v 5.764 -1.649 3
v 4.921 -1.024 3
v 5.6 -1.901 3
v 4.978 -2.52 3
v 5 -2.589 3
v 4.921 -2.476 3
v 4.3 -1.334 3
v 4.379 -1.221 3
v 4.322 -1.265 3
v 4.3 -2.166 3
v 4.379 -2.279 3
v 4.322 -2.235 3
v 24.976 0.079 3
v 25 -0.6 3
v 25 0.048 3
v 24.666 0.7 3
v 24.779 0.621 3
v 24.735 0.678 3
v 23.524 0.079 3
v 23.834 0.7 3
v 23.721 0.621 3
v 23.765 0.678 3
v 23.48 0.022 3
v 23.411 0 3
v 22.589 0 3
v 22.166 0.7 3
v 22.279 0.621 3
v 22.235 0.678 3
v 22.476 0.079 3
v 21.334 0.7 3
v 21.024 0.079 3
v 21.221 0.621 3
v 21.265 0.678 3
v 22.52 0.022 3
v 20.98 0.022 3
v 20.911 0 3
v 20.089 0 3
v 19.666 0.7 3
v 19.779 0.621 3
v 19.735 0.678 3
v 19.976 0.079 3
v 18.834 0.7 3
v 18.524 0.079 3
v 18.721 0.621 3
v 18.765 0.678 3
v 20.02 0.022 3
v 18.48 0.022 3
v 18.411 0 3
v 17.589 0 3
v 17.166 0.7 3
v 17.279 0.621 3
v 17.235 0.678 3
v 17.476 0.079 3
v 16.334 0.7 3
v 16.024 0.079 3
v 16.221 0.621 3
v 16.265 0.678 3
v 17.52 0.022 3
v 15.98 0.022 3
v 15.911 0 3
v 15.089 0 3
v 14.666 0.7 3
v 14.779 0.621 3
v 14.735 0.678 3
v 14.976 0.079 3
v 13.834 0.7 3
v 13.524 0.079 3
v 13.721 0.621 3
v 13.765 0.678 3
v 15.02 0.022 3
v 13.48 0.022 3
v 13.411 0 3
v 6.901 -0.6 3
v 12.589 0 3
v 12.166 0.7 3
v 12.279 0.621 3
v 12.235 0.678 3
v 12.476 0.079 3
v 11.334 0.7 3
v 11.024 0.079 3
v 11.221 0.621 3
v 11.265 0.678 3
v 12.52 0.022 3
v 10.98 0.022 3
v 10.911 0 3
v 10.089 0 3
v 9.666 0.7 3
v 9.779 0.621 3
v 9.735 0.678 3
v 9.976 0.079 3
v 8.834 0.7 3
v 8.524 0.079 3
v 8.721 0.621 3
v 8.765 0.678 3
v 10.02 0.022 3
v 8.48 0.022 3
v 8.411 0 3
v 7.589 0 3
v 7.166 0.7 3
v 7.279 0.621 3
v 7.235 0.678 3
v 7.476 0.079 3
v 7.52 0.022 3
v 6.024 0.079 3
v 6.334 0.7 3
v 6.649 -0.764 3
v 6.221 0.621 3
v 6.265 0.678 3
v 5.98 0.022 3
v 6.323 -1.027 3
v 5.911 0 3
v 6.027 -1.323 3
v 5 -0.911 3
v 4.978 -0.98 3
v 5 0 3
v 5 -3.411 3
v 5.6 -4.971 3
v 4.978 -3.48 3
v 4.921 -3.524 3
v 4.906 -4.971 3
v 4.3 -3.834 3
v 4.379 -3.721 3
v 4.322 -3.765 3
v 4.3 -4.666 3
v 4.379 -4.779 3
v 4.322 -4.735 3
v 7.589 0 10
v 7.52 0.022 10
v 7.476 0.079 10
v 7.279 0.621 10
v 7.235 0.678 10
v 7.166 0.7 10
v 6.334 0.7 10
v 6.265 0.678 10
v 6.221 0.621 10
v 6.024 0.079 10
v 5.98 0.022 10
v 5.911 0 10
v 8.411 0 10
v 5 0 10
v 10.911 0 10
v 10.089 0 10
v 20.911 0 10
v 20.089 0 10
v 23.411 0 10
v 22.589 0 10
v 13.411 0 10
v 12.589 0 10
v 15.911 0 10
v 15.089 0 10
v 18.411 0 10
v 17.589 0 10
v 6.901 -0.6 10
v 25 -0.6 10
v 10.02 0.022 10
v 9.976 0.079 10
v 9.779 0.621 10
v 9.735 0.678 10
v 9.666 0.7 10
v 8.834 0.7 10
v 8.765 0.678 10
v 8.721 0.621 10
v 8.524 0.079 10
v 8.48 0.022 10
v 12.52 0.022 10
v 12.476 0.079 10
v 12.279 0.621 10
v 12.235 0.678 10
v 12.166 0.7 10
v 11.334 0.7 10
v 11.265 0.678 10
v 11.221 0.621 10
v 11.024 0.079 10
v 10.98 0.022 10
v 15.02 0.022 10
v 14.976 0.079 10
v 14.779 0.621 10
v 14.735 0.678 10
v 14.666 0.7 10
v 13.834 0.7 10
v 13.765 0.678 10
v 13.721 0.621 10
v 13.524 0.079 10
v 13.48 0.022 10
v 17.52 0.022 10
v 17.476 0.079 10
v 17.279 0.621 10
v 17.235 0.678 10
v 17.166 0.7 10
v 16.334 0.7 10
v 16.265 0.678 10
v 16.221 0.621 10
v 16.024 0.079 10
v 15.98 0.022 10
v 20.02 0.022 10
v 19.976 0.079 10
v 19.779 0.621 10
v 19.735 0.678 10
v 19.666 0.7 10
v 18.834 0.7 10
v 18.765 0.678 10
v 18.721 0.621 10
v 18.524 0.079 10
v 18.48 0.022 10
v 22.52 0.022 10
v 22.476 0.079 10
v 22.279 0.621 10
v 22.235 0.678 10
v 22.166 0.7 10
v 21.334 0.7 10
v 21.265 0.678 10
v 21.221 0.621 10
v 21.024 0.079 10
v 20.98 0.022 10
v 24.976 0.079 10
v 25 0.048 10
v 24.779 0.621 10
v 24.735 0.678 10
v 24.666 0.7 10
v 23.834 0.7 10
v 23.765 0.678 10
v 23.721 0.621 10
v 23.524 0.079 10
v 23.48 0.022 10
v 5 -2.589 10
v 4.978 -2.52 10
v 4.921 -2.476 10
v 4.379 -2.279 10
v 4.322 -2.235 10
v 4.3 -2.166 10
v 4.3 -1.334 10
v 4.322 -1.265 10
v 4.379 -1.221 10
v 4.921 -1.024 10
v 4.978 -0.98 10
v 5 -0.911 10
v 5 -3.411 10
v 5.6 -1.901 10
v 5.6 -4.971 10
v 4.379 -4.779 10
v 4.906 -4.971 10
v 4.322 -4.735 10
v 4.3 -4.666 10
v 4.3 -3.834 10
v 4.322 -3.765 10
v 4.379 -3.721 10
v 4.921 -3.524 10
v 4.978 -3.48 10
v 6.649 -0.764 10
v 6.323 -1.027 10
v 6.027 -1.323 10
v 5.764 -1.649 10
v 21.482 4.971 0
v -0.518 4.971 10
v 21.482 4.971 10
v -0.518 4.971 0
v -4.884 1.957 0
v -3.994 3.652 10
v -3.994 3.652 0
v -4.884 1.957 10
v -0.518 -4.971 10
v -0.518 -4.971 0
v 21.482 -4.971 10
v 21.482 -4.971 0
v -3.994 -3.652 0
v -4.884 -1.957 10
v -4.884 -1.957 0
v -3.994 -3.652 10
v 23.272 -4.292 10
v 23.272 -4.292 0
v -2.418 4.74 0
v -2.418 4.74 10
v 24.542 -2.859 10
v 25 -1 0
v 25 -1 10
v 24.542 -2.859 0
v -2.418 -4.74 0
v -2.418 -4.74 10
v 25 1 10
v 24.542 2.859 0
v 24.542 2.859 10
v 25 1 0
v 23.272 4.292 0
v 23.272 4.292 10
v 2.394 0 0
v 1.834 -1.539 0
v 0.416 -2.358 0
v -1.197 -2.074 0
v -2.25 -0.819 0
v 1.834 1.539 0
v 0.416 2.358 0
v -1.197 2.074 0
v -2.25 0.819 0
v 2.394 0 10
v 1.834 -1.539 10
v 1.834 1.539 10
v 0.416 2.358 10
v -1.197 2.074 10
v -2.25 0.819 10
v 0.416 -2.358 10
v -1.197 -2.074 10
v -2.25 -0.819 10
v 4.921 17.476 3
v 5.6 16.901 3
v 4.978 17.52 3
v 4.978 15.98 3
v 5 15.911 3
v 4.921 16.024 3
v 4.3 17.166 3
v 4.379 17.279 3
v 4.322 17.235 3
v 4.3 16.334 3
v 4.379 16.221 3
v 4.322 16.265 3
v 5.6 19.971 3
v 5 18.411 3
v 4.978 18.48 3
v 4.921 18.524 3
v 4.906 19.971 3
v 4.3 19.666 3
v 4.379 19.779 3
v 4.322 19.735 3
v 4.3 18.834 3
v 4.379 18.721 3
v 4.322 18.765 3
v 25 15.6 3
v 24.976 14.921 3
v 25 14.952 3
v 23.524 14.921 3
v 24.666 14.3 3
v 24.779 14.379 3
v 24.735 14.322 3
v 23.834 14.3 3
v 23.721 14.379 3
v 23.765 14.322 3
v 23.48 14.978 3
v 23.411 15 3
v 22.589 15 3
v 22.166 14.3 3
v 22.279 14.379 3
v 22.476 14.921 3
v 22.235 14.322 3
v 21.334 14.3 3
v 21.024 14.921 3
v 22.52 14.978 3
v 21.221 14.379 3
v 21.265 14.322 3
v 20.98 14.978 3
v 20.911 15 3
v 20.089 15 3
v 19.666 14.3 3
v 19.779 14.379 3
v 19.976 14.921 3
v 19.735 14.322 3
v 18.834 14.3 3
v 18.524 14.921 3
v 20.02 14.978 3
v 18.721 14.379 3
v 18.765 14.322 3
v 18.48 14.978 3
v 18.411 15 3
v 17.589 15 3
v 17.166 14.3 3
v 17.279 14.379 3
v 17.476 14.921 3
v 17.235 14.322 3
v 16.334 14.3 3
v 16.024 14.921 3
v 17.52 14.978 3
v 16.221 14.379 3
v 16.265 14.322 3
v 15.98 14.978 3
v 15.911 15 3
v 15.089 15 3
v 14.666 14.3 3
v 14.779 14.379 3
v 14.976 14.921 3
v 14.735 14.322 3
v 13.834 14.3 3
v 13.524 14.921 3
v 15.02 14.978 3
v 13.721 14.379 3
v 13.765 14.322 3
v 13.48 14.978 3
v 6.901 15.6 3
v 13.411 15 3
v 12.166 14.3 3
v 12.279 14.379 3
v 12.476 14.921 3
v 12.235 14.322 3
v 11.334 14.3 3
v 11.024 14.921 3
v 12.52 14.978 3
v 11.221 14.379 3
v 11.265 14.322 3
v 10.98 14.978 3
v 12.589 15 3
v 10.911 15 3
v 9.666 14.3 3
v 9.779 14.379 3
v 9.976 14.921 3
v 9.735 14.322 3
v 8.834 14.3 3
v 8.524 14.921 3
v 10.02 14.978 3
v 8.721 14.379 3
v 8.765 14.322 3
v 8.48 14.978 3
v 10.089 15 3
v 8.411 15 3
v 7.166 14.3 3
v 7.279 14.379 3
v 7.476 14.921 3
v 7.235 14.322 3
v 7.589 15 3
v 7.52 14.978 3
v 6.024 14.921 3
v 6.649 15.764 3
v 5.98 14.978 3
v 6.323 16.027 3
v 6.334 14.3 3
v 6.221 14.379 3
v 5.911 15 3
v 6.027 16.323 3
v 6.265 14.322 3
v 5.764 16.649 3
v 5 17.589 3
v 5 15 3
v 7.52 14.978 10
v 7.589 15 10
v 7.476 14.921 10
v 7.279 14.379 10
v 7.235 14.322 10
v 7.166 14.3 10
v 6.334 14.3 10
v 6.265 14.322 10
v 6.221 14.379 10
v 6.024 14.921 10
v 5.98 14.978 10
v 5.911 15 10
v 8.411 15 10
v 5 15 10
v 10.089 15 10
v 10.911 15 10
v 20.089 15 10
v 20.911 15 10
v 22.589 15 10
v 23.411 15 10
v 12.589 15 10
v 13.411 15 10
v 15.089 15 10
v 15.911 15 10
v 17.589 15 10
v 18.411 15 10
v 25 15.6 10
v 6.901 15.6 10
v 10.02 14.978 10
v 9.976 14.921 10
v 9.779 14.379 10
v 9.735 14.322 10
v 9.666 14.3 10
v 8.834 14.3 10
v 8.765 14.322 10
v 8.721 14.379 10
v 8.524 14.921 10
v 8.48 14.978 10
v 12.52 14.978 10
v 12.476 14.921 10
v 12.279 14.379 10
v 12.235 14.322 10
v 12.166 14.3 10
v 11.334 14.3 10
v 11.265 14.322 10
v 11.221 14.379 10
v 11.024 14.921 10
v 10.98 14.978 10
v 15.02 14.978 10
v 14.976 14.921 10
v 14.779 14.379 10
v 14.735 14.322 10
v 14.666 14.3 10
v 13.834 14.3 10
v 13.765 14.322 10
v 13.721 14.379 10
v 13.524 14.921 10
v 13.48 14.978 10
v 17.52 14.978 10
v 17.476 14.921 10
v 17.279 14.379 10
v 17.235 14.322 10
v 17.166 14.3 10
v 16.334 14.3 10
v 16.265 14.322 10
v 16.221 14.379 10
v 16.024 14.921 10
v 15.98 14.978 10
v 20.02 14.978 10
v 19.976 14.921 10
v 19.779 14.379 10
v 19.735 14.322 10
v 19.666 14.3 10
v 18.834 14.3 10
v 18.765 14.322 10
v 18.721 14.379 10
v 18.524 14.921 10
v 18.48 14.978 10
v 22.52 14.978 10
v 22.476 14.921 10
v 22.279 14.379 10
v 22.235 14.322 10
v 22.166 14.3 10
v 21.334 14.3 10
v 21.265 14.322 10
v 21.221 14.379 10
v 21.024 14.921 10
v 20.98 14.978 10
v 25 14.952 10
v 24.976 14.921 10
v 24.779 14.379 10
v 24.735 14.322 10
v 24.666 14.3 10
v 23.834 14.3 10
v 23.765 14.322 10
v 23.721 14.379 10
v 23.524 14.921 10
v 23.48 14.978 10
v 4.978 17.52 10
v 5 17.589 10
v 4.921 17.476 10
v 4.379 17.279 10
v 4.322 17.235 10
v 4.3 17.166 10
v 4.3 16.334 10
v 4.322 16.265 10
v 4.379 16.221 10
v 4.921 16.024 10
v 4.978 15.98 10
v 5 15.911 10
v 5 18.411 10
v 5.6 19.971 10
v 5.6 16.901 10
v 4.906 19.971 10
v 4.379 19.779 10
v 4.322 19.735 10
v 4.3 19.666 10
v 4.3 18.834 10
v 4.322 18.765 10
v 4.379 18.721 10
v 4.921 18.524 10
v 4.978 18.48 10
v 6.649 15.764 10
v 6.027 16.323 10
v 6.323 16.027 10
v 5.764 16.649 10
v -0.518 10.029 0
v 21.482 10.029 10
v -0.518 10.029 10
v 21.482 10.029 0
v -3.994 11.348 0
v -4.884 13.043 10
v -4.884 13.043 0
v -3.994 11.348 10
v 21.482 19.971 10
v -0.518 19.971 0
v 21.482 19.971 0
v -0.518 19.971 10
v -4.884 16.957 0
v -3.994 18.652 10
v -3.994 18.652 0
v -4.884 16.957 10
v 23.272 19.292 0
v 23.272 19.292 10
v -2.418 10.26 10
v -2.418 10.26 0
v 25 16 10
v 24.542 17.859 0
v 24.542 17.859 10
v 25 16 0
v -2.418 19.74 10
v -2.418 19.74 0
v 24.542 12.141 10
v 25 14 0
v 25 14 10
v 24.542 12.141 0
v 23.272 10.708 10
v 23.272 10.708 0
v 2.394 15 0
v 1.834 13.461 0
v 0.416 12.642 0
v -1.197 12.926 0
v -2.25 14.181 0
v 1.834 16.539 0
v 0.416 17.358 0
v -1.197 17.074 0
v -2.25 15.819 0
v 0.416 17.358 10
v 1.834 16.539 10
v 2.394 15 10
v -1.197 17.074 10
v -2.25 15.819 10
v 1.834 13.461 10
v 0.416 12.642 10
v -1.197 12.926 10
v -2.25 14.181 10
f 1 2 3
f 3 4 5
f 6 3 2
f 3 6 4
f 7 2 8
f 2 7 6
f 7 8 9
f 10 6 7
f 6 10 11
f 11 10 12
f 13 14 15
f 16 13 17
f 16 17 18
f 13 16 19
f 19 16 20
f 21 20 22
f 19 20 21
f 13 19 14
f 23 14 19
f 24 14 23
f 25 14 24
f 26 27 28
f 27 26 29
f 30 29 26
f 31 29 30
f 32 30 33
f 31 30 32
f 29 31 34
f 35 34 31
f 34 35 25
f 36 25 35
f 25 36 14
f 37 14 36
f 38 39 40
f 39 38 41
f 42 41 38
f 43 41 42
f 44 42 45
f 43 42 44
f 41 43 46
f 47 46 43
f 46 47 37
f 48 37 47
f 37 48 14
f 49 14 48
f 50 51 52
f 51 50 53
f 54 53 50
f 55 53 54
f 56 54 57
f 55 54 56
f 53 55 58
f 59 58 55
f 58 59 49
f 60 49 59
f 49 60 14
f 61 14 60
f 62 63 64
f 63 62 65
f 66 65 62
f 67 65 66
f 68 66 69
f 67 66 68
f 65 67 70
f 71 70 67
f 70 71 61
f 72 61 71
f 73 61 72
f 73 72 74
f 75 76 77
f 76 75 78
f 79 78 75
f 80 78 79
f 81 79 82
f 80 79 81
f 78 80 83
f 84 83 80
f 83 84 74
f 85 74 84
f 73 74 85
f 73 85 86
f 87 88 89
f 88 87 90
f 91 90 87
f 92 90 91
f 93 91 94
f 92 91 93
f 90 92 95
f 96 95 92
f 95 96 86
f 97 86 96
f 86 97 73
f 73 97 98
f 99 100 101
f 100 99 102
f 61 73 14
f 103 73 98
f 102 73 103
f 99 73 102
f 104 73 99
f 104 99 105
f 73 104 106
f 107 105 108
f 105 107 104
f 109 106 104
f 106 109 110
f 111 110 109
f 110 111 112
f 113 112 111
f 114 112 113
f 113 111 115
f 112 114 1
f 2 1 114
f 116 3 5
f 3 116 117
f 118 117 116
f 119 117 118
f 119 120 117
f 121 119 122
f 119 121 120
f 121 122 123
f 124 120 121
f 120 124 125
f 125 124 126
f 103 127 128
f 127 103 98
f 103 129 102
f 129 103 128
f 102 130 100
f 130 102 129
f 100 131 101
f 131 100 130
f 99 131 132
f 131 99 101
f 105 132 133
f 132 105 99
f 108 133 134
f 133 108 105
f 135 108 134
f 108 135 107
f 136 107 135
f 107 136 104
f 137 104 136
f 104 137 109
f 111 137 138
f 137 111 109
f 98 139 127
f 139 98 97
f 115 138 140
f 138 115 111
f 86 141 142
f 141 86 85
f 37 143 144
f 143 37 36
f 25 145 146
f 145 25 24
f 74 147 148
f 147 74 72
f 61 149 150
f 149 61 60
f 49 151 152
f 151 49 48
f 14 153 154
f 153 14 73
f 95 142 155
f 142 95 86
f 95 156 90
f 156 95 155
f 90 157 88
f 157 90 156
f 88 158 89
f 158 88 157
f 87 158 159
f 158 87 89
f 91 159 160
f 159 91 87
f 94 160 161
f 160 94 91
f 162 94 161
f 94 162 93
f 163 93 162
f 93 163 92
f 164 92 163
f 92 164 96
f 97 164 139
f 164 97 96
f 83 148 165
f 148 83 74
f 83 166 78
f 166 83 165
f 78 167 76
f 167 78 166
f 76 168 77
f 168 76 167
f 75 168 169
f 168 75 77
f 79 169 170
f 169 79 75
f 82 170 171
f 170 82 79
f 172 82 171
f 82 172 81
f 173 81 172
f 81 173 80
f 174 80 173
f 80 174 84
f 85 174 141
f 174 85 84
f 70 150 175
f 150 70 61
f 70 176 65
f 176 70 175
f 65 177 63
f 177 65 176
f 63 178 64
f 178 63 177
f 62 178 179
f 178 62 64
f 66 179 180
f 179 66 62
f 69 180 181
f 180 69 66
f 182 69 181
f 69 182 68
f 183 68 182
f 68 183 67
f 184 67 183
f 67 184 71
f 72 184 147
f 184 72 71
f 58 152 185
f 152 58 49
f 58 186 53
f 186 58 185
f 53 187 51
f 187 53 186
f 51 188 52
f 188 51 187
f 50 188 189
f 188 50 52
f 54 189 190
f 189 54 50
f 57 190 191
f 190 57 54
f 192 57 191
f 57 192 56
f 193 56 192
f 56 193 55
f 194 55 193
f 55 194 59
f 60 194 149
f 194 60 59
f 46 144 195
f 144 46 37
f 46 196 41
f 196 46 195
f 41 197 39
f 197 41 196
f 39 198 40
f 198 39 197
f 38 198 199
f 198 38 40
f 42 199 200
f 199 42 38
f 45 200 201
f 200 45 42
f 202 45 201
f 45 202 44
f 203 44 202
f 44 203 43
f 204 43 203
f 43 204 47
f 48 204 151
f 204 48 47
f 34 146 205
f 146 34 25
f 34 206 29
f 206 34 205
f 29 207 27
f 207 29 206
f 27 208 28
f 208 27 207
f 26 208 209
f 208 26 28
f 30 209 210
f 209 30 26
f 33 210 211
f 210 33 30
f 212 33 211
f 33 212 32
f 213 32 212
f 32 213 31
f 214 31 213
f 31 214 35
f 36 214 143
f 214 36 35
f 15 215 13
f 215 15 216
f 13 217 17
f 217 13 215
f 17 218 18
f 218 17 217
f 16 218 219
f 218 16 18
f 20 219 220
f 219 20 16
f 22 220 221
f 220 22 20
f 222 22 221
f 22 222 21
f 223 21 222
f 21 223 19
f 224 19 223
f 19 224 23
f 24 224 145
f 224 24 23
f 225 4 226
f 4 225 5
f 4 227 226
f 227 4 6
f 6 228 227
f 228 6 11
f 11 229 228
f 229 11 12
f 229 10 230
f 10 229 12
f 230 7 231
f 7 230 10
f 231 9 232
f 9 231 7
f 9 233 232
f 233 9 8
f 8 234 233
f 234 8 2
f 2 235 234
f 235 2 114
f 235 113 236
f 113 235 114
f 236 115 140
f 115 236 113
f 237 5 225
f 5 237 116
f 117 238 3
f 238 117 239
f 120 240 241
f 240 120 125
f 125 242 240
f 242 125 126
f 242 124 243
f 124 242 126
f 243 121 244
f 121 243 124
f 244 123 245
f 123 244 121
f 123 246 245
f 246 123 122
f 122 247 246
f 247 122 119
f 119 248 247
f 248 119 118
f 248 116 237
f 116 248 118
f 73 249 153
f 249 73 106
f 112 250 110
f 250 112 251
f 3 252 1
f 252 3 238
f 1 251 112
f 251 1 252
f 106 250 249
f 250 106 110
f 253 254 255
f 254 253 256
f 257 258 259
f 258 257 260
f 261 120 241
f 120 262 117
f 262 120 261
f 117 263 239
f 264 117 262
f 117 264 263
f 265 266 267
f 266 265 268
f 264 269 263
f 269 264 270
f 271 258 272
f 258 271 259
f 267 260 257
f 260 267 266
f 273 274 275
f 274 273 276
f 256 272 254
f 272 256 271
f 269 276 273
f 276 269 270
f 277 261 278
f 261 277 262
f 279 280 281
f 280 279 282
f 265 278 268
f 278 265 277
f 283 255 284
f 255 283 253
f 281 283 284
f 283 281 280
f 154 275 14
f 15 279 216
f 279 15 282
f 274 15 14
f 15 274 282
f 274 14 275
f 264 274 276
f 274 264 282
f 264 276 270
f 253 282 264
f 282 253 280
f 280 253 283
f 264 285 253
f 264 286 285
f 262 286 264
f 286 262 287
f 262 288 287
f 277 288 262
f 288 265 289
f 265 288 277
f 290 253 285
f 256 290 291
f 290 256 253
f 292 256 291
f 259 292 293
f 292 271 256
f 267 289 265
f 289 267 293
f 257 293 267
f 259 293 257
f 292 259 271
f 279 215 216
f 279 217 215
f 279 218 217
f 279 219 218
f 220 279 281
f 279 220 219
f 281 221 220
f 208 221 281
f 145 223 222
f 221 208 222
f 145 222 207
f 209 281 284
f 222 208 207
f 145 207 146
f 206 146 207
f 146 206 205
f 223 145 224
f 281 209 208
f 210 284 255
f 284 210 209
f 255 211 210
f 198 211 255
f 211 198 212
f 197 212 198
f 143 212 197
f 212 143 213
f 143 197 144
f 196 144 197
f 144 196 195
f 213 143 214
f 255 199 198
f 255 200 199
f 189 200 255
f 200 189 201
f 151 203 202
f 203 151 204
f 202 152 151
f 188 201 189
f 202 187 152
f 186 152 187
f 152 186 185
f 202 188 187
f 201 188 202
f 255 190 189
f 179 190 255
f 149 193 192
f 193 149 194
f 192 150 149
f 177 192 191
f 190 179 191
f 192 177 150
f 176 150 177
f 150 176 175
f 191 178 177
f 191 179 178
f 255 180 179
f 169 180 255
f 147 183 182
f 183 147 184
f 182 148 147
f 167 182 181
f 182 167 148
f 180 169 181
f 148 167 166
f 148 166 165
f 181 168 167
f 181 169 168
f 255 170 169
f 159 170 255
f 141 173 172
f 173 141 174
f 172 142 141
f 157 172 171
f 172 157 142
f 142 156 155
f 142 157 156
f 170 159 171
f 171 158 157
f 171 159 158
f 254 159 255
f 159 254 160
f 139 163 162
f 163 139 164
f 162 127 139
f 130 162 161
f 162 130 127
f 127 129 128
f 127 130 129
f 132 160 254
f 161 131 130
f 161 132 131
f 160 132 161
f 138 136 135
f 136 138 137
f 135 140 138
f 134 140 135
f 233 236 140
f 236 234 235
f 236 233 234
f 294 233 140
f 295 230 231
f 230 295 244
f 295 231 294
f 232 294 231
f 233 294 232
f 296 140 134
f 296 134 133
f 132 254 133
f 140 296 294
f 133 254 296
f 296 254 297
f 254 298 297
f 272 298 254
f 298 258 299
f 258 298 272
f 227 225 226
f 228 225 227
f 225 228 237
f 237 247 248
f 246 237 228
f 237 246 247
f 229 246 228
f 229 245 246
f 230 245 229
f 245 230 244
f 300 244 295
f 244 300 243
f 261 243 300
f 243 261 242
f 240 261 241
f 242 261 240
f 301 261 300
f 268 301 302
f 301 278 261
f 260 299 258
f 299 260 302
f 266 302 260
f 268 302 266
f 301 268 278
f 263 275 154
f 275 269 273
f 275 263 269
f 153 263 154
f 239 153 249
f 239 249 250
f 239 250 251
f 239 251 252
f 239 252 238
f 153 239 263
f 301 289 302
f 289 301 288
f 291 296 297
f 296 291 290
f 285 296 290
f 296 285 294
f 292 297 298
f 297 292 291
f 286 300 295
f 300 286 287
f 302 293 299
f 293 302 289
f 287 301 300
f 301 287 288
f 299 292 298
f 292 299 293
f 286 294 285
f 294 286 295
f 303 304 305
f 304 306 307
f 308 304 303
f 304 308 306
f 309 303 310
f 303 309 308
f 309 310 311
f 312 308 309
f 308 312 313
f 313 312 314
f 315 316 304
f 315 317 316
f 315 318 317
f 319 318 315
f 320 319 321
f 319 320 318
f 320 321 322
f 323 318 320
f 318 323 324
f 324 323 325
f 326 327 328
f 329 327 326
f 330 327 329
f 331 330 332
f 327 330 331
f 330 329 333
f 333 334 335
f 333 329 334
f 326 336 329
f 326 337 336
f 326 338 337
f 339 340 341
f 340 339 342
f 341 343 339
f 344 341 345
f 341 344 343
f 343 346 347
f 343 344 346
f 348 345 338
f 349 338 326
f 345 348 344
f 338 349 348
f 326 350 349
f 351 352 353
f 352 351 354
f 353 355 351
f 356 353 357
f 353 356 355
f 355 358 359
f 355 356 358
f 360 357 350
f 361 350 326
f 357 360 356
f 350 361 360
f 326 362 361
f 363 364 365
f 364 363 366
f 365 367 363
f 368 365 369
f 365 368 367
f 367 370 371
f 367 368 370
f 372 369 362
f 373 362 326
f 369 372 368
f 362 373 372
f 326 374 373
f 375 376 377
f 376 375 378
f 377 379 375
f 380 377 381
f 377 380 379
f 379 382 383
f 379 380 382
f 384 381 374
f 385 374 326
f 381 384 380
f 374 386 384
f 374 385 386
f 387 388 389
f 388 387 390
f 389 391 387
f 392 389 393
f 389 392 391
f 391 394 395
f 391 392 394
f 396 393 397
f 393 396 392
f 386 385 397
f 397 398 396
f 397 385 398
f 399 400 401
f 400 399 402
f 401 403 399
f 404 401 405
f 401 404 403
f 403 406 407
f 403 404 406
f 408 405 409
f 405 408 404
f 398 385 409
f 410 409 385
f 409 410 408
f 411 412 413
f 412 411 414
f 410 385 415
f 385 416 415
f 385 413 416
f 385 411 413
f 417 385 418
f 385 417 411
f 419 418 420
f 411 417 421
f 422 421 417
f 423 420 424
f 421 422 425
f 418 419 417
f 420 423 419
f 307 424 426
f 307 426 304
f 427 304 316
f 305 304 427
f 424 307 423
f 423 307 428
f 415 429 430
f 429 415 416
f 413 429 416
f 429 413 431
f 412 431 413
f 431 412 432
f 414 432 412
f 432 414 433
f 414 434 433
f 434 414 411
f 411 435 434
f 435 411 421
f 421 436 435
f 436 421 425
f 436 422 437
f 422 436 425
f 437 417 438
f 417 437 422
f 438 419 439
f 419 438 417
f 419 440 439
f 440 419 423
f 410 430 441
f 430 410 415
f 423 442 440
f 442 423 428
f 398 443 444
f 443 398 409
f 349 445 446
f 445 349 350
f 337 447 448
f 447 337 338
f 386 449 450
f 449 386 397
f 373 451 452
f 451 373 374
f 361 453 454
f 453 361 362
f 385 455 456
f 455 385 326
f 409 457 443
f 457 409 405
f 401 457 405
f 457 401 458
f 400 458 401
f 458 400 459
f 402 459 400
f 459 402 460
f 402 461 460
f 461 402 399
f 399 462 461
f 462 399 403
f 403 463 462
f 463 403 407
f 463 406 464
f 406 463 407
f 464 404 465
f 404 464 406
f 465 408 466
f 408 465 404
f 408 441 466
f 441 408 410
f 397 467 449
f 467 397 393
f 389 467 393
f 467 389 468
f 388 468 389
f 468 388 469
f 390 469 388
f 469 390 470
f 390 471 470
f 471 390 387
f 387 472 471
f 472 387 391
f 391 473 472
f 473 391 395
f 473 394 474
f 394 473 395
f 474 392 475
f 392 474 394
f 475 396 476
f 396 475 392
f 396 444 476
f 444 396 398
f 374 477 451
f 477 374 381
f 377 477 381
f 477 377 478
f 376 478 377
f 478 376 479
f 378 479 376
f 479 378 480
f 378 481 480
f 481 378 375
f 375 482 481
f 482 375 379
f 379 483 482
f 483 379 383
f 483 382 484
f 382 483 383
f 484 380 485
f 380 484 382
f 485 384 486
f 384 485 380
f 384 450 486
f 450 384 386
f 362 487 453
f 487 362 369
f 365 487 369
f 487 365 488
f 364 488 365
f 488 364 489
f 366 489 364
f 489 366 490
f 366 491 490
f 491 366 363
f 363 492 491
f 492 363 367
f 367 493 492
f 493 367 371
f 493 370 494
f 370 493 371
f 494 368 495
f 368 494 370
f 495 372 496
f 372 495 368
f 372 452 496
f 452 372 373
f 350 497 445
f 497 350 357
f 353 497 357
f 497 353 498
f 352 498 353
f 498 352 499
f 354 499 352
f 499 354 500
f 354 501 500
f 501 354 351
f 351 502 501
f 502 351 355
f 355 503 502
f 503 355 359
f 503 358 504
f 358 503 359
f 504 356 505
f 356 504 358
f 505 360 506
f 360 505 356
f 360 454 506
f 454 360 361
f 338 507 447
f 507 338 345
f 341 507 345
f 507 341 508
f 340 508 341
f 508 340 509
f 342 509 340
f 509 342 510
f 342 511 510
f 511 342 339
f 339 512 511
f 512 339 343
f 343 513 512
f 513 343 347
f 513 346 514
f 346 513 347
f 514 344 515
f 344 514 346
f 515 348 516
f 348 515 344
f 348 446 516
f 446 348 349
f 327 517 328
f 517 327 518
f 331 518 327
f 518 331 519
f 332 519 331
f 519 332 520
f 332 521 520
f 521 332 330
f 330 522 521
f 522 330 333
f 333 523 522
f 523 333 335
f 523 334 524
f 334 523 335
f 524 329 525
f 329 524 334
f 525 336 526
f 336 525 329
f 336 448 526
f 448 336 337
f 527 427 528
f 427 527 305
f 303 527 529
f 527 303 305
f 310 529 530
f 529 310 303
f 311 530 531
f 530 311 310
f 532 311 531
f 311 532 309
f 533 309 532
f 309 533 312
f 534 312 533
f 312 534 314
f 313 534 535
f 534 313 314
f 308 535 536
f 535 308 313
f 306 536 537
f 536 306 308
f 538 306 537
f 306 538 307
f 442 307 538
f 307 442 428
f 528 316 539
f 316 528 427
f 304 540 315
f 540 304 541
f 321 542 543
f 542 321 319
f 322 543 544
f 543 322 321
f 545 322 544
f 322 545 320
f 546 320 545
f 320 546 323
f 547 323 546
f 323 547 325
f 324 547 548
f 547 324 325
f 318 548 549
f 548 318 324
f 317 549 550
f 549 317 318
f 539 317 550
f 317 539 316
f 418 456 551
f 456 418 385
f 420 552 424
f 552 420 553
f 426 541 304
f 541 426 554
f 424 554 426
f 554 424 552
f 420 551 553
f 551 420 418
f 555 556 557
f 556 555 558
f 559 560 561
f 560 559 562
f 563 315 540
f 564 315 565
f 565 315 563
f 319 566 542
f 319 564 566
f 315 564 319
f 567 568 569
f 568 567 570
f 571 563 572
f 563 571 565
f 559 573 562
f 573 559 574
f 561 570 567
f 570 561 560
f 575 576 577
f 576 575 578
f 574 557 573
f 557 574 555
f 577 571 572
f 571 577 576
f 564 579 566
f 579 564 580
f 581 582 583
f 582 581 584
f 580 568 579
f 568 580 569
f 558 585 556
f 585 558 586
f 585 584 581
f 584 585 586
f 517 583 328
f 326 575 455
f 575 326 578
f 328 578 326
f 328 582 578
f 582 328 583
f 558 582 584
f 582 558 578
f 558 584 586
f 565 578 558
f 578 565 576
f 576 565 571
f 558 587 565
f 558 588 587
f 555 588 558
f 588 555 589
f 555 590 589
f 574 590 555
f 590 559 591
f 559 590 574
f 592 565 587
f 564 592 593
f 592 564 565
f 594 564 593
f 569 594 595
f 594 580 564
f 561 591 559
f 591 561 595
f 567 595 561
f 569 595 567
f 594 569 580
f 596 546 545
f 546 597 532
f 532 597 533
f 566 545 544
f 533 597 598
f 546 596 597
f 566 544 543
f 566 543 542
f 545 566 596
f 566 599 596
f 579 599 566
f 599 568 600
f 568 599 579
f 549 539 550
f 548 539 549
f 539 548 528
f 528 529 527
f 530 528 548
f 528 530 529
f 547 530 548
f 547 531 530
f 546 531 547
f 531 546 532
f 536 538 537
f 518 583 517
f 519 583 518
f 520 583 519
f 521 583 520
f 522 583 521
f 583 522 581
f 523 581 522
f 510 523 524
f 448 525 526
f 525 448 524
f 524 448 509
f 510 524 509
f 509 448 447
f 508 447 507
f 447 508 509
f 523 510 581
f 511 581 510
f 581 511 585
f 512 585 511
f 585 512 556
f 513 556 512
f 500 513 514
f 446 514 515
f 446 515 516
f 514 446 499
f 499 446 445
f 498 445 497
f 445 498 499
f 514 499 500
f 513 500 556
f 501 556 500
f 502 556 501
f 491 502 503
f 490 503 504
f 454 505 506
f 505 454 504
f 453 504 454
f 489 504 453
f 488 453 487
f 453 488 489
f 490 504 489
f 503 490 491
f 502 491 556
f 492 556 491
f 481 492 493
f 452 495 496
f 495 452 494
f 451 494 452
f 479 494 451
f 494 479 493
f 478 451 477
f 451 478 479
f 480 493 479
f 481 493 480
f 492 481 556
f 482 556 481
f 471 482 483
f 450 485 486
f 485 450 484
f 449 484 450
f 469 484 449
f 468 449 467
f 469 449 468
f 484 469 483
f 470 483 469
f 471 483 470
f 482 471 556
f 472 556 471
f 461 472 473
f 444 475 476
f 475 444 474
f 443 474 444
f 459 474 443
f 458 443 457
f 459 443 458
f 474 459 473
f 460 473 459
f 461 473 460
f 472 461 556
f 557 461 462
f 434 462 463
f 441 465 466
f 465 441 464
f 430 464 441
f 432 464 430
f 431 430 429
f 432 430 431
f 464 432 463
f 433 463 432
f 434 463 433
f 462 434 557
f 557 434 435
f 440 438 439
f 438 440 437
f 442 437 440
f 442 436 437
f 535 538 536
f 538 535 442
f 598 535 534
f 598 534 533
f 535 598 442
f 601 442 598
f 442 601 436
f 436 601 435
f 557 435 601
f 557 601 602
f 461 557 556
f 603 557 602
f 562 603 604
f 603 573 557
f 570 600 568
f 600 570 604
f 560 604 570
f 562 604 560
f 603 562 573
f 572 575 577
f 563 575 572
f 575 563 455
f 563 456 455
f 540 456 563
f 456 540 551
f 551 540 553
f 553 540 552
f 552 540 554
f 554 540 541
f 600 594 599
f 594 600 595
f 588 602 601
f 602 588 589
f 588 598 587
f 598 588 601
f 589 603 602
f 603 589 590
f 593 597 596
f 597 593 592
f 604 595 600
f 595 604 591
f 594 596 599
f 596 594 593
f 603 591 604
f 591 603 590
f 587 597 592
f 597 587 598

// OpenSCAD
// file: timing_belts.scad
/*Parametric belting section generator 
By - The DoomMeister
Derived from http://www.thingiverse.com/thing:16627 by Droftarts
*/


//Variables
tooth_profile = "MXL"; // "T2.5", "T5" , "T10"
belt_width = 4;
n = 20;

//Draw
/*
belt_length(profile = tooth_profile, belt_width = 10, n = 30);
translate([0,0,-20])color("red")belt_length(profile = "T5", belt_width = 10, n = 15);
translate([0,0,-40])color("green")belt_length(profile = "T10", belt_width = 10, n = 8);
*/

//Outer Module
module belt_length(profile = "T2.5", belt_width = 6, n = 10)
{

			if ( profile == "T2.5" ) 
				{ 
					_belt_length(
						profile=profile, 
						n = n, 
						belt_width = belt_width,
						tooth_pitch = 2.5,
						backing_thickness = 0.6	
						);
				}
			if ( profile == "T5" ) 
				{ 
					_belt_length(
						profile=profile, 
						n = n, 
						belt_width = belt_width,
						tooth_pitch = 5,
						backing_thickness = 1	
						);
				}
			if ( profile == "T10" ) 
				{ 
					_belt_length(
						profile=profile, 
						n = n, 
						belt_width = belt_width,
						tooth_pitch = 10,
						backing_thickness = 2
						);
				}
			if ( profile == "MXL" ) 
				{ 
					_belt_length(
						profile=profile, 
						n = n, 
						belt_width = belt_width,
						tooth_pitch = 2.032,
						backing_thickness = 0.64
						);
				}


}



//inner module
module _belt_length(profile = "T2.5", n = 10, belt_width = 5, tooth_pitch = 2.5, backing_thickness = 0.6)
{

for( i = [0:n])
	{
		union(){

			if ( profile == "T2.5" ) { translate([tooth_pitch*i,0,0])T2_5(width = belt_width);}
			if ( profile == "T5" ) { translate([tooth_pitch*i,0,0])T5(width = belt_width);}
			if ( profile == "T10" ) { translate([tooth_pitch*i,0,0])T10(width = belt_width);}
			if ( profile == "MXL" ) { translate([tooth_pitch*i,0,0])MXL(width = belt_width);}
			translate([(tooth_pitch*i)-(tooth_pitch/2),-backing_thickness,0])cube([tooth_pitch,backing_thickness,belt_width]);
		}
	}
}



//Tooth Form modules - Taken from http://www.thingiverse.com/thing:1662
module T2_5(width = 2)
	{
	linear_extrude(height=width) polygon([[-0.839258,-0.5],[-0.839258,0],[-0.770246,0.021652],[-0.726369,0.079022],[-0.529167,0.620889],[-0.485025,0.67826],[-0.416278,0.699911],[0.416278,0.699911],[0.484849,0.67826],[0.528814,0.620889],[0.726369,0.079022],[0.770114,0.021652],[0.839258,0],[0.839258,-0.5]]);
	}

module T5(width = 2)
	{
	linear_extrude(height=width) polygon([[-1.632126,-0.5],[-1.632126,0],[-1.568549,0.004939],[-1.507539,0.019367],[-1.450023,0.042686],[-1.396912,0.074224],[-1.349125,0.113379],[-1.307581,0.159508],[-1.273186,0.211991],[-1.246868,0.270192],[-1.009802,0.920362],[-0.983414,0.978433],[-0.949018,1.030788],[-0.907524,1.076798],[-0.859829,1.115847],[-0.80682,1.147314],[-0.749402,1.170562],[-0.688471,1.184956],[-0.624921,1.189895],[0.624971,1.189895],[0.688622,1.184956],[0.749607,1.170562],[0.807043,1.147314],[0.860055,1.115847],[0.907754,1.076798],[0.949269,1.030788],[0.9837,0.978433],[1.010193,0.920362],[1.246907,0.270192],[1.273295,0.211991],[1.307726,0.159508],[1.349276,0.113379],[1.397039,0.074224],[1.450111,0.042686],[1.507589,0.019367],[1.568563,0.004939],[1.632126,0],[1.632126,-0.5]]);
	}

module T10(width = 2)
	{
	linear_extrude(height=width) polygon([[-3.06511,-1],[-3.06511,0],[-2.971998,0.007239],[-2.882718,0.028344],[-2.79859,0.062396],[-2.720931,0.108479],[-2.651061,0.165675],[-2.590298,0.233065],[-2.539962,0.309732],[-2.501371,0.394759],[-1.879071,2.105025],[-1.840363,2.190052],[-1.789939,2.266719],[-1.729114,2.334109],[-1.659202,2.391304],[-1.581518,2.437387],[-1.497376,2.47144],[-1.408092,2.492545],[-1.314979,2.499784],[1.314979,2.499784],[1.408091,2.492545],[1.497371,2.47144],[1.581499,2.437387],[1.659158,2.391304],[1.729028,2.334109],[1.789791,2.266719],[1.840127,2.190052],[1.878718,2.105025],[2.501018,0.394759],[2.539726,0.309732],[2.59015,0.233065],[2.650975,0.165675],[2.720887,0.108479],[2.798571,0.062396],[2.882713,0.028344],[2.971997,0.007239],[3.06511,0],[3.06511,-1]]);
	}

module MXL(width = 2)
	{
	linear_extrude(height=width) polygon([[-0.660421,-0.5],[-0.660421,0],[-0.621898,0.006033],[-0.587714,0.023037],[-0.560056,0.049424],[-0.541182,0.083609],[-0.417357,0.424392],[-0.398413,0.458752],[-0.370649,0.48514],[-0.336324,0.502074],[-0.297744,0.508035],[0.297744,0.508035],[0.336268,0.502074],[0.370452,0.48514],[0.39811,0.458752],[0.416983,0.424392],[0.540808,0.083609],[0.559752,0.049424],[0.587516,0.023037],[0.621841,0.006033],[0.660421,0],[0.660421,-0.5]]);
	}
// file: util.scad
module hexagon(size, h, center=false) {
    boxWidth=size/1.75;
    translate ([0, 0, center ? 0 : h/2]) {
        union(){
            cube([boxWidth, size, h], center=true);
            rotate([0,0,60]) cube([boxWidth, size, h], center=true);
            rotate([0,0,-60]) cube([boxWidth, size, h], center=true);
        }
    }
}

module polyhole(d, h, center=false, d1=-1, d2=-1) {
    n = max(round(2 * ((d1<0 || d2<0) ? d : max(d1, d2))),3);
    if (d1<0 || d2<0) {
        cylinder(h = h, r = (d / 2) / cos (180 / n), center=center, $fn = n);
    } else {
        cylinder(h = h, r1 = (d1 / 2) / cos (180 / n), r2 = (d2 / 2) / cos (180 / n), center=center, $fn = n);
    }
}
// main file
include <Kikai Woody.scad>;

timing_belt_trap_x();
translate([0, 15,0]) mirror([0, 1, 0]) timing_belt_trap_x();
